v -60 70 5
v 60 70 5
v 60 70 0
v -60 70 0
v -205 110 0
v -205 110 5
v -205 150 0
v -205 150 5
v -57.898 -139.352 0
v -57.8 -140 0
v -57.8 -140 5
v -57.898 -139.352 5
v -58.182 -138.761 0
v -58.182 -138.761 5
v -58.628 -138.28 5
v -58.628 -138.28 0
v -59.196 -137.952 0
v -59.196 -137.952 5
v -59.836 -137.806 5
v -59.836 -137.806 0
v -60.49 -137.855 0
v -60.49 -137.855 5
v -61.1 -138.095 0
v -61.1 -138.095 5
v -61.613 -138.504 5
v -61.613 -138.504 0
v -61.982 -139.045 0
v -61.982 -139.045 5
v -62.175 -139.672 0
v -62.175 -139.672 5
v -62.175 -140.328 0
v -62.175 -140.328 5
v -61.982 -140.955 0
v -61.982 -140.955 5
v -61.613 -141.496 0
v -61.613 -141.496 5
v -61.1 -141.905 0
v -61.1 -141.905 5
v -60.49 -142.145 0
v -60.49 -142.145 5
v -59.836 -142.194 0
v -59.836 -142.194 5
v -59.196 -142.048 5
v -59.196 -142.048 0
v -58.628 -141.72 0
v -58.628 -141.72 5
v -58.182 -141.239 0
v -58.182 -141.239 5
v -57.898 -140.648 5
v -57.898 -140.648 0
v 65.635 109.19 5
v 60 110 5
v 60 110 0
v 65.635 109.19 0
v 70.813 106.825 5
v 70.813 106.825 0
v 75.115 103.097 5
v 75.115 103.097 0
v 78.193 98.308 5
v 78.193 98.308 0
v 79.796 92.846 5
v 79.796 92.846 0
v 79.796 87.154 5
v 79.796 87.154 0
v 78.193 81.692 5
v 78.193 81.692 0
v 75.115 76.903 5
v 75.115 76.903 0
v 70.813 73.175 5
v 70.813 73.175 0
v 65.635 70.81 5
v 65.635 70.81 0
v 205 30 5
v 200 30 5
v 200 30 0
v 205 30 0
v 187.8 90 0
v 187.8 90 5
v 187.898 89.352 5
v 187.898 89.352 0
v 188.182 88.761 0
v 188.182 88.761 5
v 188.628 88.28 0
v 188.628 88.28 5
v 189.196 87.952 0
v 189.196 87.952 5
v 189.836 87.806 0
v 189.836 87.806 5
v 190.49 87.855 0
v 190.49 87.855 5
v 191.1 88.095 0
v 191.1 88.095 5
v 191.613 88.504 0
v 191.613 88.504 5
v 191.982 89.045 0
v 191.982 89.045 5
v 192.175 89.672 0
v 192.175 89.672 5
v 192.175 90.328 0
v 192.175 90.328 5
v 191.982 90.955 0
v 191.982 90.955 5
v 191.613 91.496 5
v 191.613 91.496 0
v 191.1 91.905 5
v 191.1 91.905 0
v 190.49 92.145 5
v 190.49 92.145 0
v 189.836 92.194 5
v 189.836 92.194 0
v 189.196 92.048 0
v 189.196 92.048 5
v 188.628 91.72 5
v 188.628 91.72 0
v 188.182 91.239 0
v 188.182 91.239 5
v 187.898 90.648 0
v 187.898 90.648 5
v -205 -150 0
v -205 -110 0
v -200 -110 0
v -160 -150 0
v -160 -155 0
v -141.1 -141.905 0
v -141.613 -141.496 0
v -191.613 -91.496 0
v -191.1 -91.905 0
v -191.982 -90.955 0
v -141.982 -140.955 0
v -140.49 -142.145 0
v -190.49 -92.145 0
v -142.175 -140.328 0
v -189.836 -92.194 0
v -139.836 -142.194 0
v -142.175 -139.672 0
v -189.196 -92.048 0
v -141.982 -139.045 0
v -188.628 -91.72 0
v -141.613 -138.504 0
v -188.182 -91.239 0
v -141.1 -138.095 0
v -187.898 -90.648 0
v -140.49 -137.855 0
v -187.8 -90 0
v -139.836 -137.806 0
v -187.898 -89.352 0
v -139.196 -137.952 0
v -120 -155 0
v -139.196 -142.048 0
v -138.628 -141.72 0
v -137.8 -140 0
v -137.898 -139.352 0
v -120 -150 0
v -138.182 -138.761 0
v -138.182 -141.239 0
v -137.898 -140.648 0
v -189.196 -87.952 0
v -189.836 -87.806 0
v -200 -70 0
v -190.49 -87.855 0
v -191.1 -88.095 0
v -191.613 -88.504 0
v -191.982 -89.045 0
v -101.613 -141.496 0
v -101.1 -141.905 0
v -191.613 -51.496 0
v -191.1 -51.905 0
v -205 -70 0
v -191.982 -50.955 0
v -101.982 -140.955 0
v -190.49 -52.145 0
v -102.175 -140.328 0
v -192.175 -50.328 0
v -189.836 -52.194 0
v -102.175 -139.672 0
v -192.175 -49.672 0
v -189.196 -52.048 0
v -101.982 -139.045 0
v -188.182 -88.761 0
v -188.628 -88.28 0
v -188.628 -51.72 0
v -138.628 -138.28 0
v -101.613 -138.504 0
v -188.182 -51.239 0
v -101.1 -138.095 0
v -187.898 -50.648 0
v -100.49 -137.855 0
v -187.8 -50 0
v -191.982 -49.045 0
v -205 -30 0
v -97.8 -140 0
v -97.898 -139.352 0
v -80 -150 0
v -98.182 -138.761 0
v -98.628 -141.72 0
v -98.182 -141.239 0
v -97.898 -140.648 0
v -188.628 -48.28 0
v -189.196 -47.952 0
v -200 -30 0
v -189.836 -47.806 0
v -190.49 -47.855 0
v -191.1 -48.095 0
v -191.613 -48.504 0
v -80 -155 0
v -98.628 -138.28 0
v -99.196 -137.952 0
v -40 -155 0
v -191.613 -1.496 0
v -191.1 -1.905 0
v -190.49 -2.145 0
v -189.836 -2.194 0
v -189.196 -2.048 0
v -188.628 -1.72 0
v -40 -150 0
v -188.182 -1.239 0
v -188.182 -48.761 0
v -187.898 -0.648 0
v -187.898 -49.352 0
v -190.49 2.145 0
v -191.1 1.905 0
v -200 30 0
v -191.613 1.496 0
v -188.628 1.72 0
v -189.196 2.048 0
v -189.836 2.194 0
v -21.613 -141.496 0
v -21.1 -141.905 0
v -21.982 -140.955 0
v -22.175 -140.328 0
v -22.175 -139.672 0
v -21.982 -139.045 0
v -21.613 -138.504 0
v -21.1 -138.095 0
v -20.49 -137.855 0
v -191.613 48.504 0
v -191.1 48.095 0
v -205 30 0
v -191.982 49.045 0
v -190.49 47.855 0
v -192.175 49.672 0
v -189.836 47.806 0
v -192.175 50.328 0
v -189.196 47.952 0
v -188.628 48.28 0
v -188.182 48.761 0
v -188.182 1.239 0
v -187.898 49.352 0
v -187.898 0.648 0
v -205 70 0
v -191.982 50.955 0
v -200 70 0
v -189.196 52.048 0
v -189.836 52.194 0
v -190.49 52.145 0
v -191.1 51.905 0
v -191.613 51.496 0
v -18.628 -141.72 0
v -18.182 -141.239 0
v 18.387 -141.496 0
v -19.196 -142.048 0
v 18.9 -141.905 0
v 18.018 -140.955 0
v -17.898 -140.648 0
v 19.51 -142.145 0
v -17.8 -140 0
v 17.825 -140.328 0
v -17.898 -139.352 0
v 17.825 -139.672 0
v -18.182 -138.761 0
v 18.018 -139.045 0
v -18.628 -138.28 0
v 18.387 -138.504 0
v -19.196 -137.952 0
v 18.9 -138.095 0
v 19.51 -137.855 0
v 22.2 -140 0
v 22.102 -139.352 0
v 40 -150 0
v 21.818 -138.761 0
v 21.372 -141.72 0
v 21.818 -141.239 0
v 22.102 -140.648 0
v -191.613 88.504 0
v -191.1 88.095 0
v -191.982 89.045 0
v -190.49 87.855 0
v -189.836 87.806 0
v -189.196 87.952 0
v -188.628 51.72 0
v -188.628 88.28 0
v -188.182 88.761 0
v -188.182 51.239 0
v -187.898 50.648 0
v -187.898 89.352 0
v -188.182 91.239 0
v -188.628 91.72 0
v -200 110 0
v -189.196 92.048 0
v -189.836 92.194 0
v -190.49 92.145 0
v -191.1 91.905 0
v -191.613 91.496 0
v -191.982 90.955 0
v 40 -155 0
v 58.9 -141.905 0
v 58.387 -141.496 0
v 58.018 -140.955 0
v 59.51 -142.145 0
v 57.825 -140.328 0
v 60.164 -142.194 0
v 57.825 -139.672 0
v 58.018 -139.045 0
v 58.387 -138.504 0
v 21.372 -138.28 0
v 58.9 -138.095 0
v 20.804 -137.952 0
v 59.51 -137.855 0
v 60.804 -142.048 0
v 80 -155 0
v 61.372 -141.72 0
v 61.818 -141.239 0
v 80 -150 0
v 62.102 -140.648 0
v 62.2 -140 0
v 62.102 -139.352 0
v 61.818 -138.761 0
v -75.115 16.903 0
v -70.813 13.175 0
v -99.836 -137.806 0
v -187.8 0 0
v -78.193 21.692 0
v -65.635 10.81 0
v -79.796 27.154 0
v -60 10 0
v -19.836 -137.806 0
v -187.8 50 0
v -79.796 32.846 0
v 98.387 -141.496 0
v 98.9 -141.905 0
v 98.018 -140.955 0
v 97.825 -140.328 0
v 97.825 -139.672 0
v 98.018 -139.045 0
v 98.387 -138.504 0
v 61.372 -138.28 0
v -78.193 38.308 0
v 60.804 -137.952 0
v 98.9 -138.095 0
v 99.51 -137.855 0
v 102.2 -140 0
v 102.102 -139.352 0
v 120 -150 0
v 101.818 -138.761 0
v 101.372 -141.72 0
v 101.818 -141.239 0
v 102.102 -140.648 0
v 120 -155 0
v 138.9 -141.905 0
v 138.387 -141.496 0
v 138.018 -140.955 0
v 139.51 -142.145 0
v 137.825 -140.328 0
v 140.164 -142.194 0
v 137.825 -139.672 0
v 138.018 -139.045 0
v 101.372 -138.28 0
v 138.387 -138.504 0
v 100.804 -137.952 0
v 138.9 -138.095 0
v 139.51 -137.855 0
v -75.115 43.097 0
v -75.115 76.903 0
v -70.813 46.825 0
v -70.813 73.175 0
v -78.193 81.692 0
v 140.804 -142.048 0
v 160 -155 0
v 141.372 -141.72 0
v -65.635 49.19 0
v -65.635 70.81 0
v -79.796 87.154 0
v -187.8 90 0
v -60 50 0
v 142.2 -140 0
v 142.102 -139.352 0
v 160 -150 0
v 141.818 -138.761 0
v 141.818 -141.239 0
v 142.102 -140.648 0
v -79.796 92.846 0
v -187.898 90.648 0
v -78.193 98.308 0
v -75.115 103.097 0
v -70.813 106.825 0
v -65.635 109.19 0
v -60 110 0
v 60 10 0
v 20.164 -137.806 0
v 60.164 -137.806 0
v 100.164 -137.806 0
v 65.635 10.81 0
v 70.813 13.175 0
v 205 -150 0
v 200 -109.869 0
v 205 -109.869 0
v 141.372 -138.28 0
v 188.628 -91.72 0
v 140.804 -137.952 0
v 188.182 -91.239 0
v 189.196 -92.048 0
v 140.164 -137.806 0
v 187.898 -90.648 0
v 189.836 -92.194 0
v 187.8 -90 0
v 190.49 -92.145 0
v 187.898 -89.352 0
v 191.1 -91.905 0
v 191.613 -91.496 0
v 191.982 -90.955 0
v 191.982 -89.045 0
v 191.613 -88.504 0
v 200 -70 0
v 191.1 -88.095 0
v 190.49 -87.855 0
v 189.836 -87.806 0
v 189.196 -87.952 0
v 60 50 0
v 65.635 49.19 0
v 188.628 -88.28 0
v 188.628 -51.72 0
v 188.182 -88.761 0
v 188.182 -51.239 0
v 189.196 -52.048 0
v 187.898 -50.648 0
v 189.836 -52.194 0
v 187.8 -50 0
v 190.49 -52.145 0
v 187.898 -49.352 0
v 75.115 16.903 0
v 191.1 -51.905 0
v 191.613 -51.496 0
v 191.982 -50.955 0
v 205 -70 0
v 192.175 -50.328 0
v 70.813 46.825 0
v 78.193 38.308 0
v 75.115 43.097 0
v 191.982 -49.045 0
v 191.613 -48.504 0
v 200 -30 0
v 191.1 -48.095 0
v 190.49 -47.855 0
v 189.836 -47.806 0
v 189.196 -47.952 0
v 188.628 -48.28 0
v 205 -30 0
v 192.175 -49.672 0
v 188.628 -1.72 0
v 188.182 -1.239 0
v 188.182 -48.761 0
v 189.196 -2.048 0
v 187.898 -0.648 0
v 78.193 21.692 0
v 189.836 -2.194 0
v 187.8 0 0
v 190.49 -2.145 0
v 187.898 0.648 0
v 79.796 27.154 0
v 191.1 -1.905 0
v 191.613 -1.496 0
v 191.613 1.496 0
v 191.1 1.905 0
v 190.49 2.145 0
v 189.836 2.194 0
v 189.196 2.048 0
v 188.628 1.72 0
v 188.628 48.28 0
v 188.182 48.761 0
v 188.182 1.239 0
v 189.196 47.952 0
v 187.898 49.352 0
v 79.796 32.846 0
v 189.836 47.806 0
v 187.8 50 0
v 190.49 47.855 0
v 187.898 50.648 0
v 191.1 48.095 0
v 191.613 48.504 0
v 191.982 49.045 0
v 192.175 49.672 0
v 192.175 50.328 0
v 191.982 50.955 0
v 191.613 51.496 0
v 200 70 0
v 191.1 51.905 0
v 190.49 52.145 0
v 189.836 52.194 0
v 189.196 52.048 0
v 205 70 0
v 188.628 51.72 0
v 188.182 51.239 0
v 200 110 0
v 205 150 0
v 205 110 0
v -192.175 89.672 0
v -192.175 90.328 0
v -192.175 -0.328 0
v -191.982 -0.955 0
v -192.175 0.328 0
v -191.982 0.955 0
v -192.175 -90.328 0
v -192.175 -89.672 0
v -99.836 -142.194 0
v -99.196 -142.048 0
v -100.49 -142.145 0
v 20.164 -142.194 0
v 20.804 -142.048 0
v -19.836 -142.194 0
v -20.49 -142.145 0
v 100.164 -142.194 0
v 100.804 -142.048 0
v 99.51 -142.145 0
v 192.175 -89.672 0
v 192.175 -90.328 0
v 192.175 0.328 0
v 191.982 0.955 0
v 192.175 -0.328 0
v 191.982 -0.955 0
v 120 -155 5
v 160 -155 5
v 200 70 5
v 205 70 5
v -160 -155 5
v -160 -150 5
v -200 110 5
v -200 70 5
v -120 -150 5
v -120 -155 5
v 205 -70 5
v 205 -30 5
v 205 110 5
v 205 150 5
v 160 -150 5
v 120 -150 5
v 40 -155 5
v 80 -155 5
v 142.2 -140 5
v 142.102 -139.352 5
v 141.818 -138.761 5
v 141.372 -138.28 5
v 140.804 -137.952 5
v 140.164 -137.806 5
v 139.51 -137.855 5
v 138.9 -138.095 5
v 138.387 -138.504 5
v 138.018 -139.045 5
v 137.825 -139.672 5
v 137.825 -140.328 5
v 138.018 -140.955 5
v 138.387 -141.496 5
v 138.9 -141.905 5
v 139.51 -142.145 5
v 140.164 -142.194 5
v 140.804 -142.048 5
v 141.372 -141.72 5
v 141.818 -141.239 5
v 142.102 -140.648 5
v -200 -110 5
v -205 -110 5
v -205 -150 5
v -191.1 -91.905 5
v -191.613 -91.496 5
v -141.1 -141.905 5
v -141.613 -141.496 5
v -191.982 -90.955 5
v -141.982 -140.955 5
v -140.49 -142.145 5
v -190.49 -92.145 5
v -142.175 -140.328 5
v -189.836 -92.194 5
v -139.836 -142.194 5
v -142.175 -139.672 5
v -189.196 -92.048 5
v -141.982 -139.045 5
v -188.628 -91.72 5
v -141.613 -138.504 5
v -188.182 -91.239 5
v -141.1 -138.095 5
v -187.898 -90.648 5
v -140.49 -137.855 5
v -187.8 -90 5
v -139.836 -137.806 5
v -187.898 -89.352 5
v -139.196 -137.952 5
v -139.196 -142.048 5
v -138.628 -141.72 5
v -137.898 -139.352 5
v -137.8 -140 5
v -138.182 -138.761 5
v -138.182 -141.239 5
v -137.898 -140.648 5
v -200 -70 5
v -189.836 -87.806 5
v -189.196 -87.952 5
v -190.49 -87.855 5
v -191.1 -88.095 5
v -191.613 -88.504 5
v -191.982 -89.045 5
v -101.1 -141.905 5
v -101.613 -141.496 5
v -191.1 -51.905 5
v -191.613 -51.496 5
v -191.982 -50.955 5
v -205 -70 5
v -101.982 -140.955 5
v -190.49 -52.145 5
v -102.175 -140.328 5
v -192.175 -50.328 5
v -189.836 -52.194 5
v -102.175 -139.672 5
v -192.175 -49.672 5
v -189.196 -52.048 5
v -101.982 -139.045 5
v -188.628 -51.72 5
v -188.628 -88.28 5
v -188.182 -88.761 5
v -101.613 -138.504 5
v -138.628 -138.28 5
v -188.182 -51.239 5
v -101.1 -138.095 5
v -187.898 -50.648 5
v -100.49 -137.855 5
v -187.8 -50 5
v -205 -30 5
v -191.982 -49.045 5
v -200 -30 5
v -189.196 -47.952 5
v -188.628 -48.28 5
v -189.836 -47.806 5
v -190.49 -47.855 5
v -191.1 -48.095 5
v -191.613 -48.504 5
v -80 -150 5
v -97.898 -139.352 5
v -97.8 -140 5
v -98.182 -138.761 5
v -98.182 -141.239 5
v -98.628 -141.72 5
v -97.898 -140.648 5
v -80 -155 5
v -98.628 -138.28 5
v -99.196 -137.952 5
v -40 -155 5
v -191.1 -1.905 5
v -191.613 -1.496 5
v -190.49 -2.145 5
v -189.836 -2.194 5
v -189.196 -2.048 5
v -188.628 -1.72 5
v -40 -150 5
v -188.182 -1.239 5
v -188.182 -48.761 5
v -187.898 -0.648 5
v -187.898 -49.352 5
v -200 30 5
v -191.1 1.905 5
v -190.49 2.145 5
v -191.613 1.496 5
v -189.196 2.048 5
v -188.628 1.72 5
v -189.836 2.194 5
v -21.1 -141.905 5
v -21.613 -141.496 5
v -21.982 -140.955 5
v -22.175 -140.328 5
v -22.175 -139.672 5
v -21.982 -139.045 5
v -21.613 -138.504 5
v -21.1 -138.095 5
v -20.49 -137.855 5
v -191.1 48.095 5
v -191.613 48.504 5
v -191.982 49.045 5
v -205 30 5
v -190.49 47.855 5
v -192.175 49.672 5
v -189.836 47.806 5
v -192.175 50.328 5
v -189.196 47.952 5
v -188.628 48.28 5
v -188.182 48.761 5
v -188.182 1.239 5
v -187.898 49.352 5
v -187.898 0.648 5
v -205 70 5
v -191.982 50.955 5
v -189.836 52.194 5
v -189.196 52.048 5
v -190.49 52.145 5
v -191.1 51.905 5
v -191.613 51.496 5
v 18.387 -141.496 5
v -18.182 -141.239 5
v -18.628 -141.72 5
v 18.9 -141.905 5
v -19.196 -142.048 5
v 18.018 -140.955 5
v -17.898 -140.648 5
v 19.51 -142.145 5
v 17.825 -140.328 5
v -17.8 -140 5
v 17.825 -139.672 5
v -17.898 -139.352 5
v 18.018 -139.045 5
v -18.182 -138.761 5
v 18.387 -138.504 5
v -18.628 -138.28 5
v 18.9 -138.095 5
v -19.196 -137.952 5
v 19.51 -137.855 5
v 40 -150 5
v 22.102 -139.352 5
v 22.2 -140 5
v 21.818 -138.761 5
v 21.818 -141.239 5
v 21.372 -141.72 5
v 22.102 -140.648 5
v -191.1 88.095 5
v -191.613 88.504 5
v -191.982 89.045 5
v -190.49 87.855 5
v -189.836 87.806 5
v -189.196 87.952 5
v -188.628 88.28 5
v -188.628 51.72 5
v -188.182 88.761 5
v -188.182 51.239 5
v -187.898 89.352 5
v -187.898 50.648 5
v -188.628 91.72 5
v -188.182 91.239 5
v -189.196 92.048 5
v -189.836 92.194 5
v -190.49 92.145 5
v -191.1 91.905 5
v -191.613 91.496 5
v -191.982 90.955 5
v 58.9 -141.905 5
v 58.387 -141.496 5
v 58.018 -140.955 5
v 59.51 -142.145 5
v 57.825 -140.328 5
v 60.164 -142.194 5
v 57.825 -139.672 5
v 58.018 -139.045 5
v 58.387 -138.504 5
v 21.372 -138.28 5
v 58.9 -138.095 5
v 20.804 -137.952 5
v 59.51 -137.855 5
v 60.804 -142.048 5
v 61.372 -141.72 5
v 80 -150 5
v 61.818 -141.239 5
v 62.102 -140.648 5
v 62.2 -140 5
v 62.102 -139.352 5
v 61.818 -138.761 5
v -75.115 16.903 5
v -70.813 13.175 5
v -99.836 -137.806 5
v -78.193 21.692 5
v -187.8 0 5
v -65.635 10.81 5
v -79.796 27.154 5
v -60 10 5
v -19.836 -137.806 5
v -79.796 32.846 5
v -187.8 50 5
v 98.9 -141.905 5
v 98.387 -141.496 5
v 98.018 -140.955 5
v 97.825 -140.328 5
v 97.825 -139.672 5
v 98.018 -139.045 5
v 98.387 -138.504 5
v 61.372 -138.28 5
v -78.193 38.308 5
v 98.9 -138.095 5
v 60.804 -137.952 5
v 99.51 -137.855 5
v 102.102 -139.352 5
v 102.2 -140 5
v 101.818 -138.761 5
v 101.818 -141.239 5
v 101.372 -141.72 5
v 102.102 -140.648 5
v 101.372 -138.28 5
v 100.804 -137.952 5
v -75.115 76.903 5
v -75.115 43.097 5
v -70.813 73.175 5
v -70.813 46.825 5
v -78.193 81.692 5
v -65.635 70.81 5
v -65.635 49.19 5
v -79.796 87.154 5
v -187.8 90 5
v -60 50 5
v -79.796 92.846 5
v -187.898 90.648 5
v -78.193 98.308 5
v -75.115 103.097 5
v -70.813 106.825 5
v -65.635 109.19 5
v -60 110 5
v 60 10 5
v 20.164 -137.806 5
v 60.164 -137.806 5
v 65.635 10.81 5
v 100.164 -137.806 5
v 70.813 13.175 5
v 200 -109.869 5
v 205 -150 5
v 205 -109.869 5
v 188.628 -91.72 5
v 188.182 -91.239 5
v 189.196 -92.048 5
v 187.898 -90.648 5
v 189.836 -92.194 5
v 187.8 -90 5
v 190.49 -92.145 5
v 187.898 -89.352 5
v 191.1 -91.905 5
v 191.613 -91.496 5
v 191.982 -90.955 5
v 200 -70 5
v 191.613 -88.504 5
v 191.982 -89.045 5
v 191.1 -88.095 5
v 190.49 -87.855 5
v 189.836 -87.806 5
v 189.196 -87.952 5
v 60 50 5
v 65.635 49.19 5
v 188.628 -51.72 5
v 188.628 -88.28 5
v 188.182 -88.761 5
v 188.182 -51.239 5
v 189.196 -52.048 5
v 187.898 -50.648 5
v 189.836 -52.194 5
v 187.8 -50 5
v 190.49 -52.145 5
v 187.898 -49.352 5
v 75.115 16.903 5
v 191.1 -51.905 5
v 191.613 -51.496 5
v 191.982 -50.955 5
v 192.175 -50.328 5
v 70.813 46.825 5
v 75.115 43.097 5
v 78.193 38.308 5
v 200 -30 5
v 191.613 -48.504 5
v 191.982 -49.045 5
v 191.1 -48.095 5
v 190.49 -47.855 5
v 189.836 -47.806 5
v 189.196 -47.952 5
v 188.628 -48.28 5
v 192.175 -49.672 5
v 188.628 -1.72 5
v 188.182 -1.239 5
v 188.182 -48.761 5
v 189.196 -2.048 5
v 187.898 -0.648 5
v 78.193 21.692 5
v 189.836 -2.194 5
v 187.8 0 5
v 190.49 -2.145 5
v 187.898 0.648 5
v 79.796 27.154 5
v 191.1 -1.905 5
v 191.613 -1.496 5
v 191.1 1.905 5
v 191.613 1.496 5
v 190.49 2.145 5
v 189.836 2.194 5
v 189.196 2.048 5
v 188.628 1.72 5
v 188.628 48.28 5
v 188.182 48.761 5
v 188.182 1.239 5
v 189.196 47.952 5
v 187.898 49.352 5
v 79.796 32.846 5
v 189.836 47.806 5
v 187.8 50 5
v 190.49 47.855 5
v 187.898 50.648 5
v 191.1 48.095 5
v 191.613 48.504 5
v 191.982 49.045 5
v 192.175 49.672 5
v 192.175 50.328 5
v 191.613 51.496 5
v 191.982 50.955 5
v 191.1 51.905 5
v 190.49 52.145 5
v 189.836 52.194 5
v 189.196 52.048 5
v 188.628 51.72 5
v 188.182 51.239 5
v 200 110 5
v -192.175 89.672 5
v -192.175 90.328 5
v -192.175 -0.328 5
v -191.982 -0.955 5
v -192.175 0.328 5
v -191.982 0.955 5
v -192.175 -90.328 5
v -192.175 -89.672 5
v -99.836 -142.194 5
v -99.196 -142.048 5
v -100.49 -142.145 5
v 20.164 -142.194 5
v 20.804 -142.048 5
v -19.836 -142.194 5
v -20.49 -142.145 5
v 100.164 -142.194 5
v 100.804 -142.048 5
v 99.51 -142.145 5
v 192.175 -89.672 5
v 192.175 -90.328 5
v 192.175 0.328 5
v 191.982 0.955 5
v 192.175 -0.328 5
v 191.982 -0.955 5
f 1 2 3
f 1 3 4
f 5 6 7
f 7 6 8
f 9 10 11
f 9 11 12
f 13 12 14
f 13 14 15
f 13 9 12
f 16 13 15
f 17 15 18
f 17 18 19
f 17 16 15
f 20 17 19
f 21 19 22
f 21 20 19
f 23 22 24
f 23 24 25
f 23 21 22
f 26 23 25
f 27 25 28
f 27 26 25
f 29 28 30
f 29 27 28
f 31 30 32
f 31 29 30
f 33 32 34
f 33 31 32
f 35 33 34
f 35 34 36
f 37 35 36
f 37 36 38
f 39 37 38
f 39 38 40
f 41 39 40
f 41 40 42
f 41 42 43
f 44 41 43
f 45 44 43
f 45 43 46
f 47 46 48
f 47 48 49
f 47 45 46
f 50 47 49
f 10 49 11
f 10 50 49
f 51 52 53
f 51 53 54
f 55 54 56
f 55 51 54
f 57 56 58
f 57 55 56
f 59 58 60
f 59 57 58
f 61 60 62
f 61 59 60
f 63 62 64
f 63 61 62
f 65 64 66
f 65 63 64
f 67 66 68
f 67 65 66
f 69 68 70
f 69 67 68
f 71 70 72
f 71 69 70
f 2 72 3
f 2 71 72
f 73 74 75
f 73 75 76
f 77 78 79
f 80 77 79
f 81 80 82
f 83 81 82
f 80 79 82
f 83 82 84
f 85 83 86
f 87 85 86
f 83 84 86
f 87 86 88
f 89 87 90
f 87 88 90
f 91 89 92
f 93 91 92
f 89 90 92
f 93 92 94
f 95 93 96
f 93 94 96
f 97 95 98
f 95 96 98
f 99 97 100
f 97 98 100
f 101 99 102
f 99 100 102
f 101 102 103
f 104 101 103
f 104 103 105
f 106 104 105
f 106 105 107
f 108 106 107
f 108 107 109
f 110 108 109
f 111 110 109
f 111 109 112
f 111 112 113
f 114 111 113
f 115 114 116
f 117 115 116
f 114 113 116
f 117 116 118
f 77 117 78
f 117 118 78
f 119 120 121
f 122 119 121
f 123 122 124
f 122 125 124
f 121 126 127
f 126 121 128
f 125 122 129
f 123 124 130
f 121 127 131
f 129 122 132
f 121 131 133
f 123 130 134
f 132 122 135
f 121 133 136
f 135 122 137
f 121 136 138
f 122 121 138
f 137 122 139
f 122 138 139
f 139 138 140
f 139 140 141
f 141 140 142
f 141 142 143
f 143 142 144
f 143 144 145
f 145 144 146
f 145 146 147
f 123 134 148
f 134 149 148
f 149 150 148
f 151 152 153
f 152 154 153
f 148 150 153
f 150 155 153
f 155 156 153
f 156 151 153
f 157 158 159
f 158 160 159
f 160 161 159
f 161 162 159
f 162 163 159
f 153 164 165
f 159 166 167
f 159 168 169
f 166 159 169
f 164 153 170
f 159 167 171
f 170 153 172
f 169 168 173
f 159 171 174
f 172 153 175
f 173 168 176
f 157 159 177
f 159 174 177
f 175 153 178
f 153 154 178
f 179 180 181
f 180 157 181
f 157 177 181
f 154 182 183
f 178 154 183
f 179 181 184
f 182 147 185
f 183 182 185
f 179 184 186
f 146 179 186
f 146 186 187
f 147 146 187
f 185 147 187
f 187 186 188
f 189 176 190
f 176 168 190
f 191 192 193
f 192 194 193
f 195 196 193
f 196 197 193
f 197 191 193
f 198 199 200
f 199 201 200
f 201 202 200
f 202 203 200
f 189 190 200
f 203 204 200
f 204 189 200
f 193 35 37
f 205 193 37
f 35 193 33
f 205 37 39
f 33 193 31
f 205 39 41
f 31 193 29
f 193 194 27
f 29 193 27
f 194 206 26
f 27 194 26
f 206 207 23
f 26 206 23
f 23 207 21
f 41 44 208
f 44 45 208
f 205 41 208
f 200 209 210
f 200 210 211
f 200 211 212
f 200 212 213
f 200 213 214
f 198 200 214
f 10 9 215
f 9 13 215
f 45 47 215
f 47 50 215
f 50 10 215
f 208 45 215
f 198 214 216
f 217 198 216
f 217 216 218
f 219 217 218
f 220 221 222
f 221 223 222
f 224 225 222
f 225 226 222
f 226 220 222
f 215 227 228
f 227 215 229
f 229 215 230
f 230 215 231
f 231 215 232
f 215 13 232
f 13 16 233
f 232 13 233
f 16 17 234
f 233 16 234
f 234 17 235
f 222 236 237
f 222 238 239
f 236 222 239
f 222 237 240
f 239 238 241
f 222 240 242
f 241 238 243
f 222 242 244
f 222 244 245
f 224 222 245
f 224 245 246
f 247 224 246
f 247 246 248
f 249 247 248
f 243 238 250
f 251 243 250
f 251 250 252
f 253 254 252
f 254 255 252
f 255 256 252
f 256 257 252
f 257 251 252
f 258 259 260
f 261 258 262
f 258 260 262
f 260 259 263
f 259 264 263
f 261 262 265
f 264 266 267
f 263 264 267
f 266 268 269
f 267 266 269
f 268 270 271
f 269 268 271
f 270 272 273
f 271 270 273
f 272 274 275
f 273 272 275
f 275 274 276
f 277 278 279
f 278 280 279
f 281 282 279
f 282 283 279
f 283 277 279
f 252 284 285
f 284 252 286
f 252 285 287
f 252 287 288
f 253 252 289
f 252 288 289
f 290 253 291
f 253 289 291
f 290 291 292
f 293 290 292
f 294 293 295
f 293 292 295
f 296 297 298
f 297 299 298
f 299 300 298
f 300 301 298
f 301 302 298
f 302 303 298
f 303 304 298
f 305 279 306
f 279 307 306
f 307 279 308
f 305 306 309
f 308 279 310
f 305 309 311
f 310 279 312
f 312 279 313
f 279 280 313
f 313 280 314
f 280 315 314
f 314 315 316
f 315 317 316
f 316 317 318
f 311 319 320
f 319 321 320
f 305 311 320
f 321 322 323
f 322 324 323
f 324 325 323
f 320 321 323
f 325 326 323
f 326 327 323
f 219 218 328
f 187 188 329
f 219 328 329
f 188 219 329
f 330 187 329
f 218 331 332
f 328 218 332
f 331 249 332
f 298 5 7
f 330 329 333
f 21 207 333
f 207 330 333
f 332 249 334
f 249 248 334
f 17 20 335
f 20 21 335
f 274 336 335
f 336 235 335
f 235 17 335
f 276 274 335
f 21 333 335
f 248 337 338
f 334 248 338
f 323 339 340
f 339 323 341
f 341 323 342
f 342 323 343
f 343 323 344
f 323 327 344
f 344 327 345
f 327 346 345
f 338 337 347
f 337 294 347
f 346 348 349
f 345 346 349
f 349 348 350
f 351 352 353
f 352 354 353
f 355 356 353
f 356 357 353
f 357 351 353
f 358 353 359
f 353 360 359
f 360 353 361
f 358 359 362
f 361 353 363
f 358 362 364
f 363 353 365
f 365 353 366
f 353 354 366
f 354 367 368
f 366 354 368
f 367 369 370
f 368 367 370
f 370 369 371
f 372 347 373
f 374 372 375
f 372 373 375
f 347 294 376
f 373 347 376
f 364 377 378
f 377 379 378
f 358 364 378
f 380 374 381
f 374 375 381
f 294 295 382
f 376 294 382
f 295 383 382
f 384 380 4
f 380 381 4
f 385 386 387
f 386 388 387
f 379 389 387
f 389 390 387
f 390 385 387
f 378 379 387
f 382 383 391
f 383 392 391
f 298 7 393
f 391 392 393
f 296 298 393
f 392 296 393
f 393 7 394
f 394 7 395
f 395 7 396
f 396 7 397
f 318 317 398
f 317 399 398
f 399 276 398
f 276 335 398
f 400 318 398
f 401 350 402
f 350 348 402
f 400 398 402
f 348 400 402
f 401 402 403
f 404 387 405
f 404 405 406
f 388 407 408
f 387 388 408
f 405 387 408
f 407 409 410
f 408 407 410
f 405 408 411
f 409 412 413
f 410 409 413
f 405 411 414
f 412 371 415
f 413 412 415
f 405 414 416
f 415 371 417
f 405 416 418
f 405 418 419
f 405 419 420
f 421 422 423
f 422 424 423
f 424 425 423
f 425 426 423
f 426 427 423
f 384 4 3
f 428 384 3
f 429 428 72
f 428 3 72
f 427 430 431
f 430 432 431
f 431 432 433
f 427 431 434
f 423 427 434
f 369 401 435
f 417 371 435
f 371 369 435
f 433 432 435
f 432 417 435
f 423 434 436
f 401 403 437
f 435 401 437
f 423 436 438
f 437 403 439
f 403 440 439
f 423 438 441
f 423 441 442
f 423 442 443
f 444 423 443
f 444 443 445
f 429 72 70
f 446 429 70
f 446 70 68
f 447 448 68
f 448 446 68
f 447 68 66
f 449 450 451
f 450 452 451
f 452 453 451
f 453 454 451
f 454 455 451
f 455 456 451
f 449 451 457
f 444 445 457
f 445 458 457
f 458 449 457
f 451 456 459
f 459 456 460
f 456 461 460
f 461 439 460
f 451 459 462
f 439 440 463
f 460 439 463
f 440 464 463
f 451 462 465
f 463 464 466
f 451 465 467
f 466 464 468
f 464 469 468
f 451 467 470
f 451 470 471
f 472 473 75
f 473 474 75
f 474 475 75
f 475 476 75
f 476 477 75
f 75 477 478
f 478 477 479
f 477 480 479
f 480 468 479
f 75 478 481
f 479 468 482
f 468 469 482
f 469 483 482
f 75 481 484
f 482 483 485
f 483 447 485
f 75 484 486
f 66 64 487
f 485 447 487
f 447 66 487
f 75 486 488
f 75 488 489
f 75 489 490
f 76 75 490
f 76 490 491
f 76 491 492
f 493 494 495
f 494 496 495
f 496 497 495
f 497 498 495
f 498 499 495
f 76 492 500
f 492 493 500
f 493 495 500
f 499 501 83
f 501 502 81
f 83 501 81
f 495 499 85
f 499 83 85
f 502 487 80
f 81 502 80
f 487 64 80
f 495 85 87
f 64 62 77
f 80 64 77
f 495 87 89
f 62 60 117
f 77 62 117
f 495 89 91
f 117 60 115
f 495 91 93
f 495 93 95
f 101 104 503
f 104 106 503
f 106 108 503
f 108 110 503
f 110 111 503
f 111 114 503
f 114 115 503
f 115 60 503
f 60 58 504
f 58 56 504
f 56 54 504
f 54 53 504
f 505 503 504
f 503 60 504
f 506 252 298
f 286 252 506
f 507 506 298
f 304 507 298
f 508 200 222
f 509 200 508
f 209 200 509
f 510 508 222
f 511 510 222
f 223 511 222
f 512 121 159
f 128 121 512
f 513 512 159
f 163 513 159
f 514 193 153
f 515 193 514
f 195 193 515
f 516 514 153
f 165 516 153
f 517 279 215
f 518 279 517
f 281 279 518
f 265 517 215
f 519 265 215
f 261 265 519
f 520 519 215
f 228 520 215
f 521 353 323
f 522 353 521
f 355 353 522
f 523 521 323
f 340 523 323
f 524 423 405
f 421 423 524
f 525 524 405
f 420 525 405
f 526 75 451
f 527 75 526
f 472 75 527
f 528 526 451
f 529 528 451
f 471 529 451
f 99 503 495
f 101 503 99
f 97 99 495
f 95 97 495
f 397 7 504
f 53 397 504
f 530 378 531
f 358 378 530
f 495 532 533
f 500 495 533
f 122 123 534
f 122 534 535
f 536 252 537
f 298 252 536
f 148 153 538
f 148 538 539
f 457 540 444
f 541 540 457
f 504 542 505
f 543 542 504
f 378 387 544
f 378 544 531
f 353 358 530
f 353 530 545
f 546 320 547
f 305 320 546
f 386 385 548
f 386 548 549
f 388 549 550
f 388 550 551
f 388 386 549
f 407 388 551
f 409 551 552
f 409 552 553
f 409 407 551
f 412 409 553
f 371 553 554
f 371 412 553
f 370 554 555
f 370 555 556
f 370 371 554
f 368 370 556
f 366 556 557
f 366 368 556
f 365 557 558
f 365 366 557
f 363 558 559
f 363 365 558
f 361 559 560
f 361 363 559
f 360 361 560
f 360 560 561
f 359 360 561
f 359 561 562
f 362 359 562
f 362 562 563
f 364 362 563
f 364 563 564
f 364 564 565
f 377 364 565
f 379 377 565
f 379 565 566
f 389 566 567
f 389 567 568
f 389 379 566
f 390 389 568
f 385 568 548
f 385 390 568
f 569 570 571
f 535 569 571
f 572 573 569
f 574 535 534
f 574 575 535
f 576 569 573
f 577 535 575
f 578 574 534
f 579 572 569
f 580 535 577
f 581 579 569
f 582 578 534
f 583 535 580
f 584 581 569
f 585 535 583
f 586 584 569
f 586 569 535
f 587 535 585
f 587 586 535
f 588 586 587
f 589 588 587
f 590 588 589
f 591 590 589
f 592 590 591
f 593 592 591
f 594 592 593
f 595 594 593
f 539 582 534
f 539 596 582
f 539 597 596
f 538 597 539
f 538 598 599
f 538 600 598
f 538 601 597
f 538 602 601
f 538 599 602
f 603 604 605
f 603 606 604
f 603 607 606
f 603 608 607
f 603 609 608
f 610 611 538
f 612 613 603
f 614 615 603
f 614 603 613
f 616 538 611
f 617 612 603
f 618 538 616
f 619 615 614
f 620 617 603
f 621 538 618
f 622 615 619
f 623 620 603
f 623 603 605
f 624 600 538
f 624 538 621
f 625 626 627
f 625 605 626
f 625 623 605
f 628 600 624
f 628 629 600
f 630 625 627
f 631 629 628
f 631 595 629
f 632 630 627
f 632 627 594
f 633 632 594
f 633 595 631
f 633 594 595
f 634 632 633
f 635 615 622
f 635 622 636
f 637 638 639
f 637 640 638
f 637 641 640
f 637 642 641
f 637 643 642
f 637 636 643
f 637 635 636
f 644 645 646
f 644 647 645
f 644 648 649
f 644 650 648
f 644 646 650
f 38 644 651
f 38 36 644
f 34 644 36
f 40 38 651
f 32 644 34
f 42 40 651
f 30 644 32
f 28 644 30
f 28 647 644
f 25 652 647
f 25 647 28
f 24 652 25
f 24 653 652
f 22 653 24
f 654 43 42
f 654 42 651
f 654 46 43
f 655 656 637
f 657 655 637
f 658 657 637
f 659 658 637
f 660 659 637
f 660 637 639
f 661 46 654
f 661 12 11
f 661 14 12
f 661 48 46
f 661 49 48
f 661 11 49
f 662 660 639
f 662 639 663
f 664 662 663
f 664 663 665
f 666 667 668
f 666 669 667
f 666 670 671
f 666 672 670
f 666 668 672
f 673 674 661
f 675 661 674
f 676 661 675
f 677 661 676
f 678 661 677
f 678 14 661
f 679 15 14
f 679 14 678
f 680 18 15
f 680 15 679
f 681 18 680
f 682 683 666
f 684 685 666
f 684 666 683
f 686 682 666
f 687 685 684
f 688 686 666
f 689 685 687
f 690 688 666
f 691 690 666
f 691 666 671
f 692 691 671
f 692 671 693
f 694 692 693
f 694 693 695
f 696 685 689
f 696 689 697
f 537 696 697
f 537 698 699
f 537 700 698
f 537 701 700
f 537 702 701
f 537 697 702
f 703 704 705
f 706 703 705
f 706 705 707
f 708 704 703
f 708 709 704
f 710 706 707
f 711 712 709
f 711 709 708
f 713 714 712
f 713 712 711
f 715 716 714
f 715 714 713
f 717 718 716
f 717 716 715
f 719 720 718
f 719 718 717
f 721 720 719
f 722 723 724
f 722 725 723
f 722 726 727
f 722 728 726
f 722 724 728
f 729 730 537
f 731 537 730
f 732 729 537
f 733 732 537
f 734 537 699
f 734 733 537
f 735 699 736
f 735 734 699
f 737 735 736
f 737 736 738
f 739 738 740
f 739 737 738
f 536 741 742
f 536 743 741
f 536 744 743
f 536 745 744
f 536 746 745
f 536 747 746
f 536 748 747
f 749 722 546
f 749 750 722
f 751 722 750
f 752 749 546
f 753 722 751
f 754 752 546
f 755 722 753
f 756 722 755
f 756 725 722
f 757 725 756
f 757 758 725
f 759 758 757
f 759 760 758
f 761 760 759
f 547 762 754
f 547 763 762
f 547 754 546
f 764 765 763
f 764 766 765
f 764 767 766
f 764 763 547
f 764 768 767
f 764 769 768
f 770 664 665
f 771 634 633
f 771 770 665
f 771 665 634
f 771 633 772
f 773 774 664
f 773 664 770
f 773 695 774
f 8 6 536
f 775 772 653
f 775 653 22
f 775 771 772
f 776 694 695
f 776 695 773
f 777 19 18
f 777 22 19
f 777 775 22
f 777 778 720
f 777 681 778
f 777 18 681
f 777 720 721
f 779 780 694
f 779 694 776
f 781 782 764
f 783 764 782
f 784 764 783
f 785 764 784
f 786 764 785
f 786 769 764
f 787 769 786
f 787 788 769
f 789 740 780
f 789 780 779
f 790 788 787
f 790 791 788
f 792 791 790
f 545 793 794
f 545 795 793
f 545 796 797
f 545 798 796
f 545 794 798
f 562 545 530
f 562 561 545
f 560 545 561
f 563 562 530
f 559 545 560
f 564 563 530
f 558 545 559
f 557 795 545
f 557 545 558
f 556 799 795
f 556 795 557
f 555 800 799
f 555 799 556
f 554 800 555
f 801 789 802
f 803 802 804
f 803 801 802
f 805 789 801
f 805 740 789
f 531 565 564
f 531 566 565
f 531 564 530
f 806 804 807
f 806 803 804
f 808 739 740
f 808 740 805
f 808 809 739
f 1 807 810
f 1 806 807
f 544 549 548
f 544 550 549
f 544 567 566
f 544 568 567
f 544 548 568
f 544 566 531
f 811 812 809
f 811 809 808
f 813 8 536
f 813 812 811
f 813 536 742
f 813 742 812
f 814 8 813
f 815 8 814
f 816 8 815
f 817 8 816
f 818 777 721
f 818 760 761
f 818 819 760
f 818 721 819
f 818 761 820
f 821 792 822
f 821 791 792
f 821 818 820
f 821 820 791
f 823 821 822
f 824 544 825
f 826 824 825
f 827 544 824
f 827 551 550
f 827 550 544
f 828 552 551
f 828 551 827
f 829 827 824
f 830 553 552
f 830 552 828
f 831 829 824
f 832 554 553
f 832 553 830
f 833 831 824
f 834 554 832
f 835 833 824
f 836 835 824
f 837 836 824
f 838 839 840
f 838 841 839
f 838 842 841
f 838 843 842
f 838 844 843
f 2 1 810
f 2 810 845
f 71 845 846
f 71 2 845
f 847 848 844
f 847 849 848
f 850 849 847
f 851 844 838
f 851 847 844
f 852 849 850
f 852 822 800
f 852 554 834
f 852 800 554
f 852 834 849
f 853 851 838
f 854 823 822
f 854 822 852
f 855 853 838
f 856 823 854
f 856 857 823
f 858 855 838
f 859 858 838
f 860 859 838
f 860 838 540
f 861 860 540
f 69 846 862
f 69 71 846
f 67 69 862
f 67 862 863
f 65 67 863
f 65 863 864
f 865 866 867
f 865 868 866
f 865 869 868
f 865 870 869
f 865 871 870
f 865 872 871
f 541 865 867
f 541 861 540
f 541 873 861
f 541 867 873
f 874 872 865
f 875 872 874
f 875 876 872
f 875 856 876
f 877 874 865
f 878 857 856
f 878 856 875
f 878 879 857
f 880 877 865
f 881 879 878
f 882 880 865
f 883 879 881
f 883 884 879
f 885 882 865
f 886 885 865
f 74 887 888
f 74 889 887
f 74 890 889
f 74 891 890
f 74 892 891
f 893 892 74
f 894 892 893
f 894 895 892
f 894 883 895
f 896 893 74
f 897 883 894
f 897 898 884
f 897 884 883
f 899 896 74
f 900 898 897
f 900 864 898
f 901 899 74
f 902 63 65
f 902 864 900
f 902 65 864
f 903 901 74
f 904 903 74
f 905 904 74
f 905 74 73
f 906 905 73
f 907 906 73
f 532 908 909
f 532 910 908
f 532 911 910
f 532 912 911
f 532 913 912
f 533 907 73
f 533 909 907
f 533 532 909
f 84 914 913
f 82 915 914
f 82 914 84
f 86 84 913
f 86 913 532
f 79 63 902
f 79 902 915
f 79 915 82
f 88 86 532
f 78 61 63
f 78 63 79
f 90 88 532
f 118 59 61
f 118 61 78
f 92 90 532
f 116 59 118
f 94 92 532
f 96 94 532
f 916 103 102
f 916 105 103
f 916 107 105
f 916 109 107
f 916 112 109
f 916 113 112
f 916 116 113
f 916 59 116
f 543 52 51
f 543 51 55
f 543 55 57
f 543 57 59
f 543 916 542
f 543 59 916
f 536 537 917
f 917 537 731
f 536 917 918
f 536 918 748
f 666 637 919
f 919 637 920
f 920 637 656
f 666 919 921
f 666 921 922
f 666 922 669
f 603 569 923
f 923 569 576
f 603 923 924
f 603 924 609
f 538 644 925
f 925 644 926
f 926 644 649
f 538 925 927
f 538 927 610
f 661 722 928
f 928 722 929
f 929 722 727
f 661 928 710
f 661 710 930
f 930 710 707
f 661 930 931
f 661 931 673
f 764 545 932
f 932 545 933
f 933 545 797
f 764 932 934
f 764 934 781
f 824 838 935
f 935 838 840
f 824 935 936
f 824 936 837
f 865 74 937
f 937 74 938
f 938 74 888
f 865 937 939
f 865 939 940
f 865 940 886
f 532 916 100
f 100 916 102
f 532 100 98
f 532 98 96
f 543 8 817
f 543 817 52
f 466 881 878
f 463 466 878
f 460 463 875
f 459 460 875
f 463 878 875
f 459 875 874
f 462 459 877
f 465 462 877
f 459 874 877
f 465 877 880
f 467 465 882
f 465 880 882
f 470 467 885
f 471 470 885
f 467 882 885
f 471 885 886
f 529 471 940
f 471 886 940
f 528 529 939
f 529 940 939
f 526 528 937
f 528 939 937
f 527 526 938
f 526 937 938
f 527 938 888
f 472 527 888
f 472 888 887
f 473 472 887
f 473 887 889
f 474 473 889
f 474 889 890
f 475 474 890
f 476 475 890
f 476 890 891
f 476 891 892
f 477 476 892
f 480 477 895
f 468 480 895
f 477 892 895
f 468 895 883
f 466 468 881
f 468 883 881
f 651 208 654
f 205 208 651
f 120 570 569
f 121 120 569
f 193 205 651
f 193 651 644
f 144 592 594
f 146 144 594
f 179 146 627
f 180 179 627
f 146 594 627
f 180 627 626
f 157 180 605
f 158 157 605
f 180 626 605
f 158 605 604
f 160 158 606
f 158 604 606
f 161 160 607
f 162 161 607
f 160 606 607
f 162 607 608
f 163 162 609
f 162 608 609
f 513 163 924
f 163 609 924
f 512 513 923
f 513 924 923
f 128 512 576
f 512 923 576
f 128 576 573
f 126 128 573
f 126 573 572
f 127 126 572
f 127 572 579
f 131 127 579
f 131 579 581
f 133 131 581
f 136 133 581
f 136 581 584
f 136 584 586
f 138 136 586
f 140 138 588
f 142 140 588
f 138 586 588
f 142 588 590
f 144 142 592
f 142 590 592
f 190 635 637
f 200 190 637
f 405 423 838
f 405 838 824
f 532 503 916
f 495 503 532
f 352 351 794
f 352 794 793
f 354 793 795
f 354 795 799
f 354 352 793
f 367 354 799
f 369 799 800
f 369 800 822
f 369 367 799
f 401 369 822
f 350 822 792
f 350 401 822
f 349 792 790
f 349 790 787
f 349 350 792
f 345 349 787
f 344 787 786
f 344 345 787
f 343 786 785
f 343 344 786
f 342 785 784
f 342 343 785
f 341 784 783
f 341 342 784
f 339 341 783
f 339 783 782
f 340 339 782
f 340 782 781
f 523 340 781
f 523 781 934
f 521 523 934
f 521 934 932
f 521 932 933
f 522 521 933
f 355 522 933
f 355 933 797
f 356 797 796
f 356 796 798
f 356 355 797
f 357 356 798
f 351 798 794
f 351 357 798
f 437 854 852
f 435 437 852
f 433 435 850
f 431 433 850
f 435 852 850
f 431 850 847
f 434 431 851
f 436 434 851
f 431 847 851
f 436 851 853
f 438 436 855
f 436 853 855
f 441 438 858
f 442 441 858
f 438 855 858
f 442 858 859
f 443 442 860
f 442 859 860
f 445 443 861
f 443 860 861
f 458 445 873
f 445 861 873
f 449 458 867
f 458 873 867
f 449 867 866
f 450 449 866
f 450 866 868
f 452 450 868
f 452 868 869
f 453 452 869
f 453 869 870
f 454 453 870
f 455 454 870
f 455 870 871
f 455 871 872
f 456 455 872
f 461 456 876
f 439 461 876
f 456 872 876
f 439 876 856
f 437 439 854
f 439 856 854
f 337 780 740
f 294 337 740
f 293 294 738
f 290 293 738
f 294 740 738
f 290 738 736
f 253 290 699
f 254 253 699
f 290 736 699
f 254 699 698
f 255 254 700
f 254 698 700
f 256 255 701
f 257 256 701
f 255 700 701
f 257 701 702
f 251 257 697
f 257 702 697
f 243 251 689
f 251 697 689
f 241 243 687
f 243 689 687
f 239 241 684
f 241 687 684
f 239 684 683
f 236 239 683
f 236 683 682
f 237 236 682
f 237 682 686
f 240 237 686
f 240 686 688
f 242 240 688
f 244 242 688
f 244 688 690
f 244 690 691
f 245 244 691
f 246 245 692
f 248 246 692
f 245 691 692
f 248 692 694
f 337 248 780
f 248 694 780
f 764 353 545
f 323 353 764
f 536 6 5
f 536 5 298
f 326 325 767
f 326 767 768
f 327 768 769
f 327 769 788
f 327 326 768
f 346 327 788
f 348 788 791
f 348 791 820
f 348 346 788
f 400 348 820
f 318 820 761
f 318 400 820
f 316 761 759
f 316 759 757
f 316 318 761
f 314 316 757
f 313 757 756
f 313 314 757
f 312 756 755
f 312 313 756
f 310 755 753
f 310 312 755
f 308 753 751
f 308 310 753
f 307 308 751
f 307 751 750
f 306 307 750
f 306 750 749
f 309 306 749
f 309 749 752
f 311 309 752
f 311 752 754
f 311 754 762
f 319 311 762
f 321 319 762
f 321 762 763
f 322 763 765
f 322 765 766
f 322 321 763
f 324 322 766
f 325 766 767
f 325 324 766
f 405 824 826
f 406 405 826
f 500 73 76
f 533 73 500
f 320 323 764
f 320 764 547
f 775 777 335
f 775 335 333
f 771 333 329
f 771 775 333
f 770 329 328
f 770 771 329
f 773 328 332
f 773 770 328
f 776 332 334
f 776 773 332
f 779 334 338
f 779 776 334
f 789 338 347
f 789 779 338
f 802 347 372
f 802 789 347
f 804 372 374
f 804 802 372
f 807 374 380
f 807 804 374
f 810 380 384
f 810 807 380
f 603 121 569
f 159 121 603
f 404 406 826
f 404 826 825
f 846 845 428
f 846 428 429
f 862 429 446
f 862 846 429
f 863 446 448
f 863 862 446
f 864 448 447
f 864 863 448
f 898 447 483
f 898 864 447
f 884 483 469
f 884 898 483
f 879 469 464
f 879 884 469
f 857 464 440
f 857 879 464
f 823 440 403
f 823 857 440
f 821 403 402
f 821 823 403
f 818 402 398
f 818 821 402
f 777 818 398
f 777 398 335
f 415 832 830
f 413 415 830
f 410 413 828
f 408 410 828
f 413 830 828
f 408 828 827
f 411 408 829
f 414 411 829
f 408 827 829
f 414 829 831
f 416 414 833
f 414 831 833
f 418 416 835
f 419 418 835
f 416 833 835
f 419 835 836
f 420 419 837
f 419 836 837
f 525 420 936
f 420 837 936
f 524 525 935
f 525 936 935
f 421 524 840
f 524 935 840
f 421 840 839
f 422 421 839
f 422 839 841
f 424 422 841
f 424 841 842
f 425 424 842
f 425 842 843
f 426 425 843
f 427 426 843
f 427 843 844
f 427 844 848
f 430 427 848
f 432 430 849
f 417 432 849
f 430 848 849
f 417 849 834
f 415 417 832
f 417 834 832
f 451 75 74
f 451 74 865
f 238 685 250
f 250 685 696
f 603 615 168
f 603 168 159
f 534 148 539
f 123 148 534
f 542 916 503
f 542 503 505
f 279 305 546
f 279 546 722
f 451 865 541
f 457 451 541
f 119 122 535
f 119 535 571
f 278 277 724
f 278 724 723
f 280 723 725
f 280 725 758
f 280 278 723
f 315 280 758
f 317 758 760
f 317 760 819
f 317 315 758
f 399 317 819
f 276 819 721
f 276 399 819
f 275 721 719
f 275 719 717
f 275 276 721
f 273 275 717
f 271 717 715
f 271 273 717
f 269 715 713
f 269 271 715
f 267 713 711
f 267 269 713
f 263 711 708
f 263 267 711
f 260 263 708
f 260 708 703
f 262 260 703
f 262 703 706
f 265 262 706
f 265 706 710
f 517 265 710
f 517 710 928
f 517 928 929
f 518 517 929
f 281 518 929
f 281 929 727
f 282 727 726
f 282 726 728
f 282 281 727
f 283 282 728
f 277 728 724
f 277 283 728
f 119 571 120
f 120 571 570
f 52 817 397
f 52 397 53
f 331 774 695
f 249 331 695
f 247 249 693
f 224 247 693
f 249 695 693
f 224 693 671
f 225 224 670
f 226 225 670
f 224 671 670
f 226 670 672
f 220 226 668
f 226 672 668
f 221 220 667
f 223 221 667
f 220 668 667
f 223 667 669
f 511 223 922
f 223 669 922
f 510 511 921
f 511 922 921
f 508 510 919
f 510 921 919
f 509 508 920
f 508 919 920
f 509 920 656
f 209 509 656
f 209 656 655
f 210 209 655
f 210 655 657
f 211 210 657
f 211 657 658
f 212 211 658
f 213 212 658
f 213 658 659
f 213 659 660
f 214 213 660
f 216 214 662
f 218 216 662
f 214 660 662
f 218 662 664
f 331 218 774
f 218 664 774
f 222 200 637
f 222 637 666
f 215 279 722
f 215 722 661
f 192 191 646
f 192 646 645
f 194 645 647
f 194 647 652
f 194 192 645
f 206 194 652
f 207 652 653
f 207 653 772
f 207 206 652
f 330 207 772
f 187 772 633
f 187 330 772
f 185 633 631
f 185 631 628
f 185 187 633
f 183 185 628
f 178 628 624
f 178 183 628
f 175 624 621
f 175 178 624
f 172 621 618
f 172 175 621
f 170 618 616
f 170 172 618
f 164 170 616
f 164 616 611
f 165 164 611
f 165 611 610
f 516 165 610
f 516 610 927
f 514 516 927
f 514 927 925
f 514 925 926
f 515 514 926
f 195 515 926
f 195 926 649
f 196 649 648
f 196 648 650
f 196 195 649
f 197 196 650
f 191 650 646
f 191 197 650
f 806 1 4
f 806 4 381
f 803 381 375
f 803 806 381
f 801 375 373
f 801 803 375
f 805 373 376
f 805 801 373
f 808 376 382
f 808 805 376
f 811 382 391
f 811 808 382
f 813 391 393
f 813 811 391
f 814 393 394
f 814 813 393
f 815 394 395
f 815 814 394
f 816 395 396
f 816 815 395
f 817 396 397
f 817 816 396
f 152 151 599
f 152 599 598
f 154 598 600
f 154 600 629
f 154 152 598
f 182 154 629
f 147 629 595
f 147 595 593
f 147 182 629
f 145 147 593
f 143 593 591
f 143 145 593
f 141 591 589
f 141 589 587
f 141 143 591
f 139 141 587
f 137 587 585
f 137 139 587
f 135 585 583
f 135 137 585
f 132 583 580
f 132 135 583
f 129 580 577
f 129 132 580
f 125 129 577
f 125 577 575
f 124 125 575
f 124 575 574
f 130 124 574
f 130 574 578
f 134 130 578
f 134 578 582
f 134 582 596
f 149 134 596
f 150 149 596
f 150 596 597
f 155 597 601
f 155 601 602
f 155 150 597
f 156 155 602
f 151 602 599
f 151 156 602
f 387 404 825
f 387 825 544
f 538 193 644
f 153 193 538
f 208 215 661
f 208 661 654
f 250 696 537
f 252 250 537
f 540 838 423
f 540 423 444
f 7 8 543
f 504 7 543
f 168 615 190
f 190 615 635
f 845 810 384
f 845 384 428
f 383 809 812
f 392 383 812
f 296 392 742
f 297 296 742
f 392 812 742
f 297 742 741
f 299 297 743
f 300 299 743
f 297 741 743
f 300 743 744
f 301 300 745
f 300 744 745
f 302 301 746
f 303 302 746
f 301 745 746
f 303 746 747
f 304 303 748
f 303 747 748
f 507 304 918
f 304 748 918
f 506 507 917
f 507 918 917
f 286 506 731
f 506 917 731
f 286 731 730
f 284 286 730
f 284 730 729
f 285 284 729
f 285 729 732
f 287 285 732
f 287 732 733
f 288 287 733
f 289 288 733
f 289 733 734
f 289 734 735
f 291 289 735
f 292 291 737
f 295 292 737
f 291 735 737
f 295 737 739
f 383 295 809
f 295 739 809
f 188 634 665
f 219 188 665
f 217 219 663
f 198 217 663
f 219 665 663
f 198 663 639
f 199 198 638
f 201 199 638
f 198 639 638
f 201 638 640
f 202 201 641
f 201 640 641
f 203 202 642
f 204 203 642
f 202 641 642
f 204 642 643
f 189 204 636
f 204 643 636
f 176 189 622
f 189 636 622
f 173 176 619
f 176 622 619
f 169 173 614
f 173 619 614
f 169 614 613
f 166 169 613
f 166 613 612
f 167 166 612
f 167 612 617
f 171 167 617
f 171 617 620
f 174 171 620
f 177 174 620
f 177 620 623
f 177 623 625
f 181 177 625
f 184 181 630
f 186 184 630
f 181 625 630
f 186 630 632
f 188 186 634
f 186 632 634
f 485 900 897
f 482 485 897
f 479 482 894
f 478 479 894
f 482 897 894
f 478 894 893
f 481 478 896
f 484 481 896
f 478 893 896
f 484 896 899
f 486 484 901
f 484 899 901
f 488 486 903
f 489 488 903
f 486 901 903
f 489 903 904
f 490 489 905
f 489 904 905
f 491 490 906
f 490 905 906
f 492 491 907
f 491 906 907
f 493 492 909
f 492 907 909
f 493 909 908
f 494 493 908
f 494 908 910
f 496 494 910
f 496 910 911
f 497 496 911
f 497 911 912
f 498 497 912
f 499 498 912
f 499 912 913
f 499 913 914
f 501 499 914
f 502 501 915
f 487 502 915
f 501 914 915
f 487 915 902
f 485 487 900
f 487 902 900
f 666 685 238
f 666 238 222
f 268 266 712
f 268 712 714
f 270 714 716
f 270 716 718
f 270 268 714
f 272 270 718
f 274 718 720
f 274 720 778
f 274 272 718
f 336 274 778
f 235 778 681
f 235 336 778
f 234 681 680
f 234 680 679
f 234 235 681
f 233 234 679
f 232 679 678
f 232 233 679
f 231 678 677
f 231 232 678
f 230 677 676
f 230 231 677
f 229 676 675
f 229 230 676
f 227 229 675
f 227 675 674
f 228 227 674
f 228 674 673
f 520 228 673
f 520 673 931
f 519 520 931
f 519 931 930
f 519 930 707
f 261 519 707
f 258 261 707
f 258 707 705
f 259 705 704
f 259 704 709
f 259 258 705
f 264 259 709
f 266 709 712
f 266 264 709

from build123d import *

# Parameters (mm, degrees)
SKETCH_1_R          = 2.2
EXTRUDE_1_DEPTH     = 5
SKETCH_2_W          = 5
SKETCH_2_H          = 220.282443136
SKETCH_2_H_2        = 219.868690955
CUT_EXTRUDE_1_DEPTH = 10
SKETCH_3_W          = 5
SKETCH_3_H          = 40
EXTRUDE_3_DEPTH     = 5
SKETCH_4_W          = 390.4211829
SKETCH_4_H          = 264.690207343
EXTRUDE_4_DEPTH     = 5
SKETCH_5_R          = 2.2
CUT_EXTRUDE_2_DEPTH = 5
CUT_EXTRUDE_3_DEPTH = 10


with BuildPart() as part:
    # 草图1 → 凸台-拉伸1 (new body)
    with BuildSketch(Plane.XY):
        Polygon((-200, 150), (200, 150), (200, 110), (205, 110), (205, 70), (200, 70), (200, 30), (205, 30), (205, -30), (200, -30), (200, -70), (205, -70), (205, -110), (200, -110), (200, -150), (160, -150), (160, -155), (120, -155), (120, -150), (80, -150), (80, -155), (40, -155), (40, -150), (-40, -150), (-40, -155), (-80, -155), (-80, -150), (-120, -150), (-120, -155), (-160, -155), (-160, -150), (-200, -150), (-200, -110), (-205, -110), (-205, -70), (-200, -70), (-200, -30), (-205, -30), (-205, 30), (-200, 30), (-200, 70), (-205, 70), (-205, 110), (-200, 110), align=None)
        with Locations((-140, -140)):
            Circle(SKETCH_1_R, mode=Mode.SUBTRACT)
        with Locations((-100, -140)):
            Circle(SKETCH_1_R, mode=Mode.SUBTRACT)
        with Locations((-60, -140)):
            Circle(SKETCH_1_R, mode=Mode.SUBTRACT)
        with Locations((-20, -140)):
            Circle(SKETCH_1_R, mode=Mode.SUBTRACT)
        with Locations((20, -140)):
            Circle(SKETCH_1_R, mode=Mode.SUBTRACT)
        with Locations((60, -140)):
            Circle(SKETCH_1_R, mode=Mode.SUBTRACT)
        with Locations((100, -140)):
            Circle(SKETCH_1_R, mode=Mode.SUBTRACT)
        with Locations((140, -140)):
            Circle(SKETCH_1_R, mode=Mode.SUBTRACT)
        with Locations((-190, 110)):
            Circle(SKETCH_1_R, mode=Mode.SUBTRACT)
        with Locations((-190, 70)):
            Circle(SKETCH_1_R, mode=Mode.SUBTRACT)
        with Locations((-190, 30)):
            Circle(SKETCH_1_R, mode=Mode.SUBTRACT)
        with Locations((-190, -30)):
            Circle(SKETCH_1_R, mode=Mode.SUBTRACT)
        with Locations((-190, -70)):
            Circle(SKETCH_1_R, mode=Mode.SUBTRACT)
        with Locations((-190, -110)):
            Circle(SKETCH_1_R, mode=Mode.SUBTRACT)
        with Locations((190, -110)):
            Circle(SKETCH_1_R, mode=Mode.SUBTRACT)
        with Locations((190, -70)):
            Circle(SKETCH_1_R, mode=Mode.SUBTRACT)
        with Locations((190, -30)):
            Circle(SKETCH_1_R, mode=Mode.SUBTRACT)
        with Locations((190, 30)):
            Circle(SKETCH_1_R, mode=Mode.SUBTRACT)
        with Locations((190, 70)):
            Circle(SKETCH_1_R, mode=Mode.SUBTRACT)
        with Locations((190, 110)):
            Circle(SKETCH_1_R, mode=Mode.SUBTRACT)
    extrude(amount=EXTRUDE_1_DEPTH)

    # 草图2 → 切除-拉伸1 (cut)
    with BuildSketch(Plane.XY.offset(5)):
        with Locations((-202.5, -0.141221568)):
            Rectangle(SKETCH_2_W, SKETCH_2_H)
        with Locations((202.5, 0.065654522)):
            Rectangle(SKETCH_2_W, SKETCH_2_H_2)
    extrude(amount=-CUT_EXTRUDE_1_DEPTH, mode=Mode.SUBTRACT)

    # 草图3 → 凸台-拉伸3 (add)
    with BuildSketch(Plane.XY.offset(5)):
        with Locations((-202.5, 130)):
            Rectangle(SKETCH_3_W, SKETCH_3_H)
        with Locations((-202.5, 50)):
            Rectangle(SKETCH_3_W, SKETCH_3_H)
        with Locations((-202.5, -50)):
            Rectangle(SKETCH_3_W, SKETCH_3_H)
        with Locations((-202.5, -130)):
            Rectangle(SKETCH_3_W, SKETCH_3_H)
        with Locations((202.5, -130)):
            Rectangle(SKETCH_3_W, SKETCH_3_H)
        with Locations((202.5, -50)):
            Rectangle(SKETCH_3_W, SKETCH_3_H)
        with Locations((202.5, 50)):
            Rectangle(SKETCH_3_W, SKETCH_3_H)
        with Locations((202.5, 130)):
            Rectangle(SKETCH_3_W, SKETCH_3_H)
    extrude(amount=-EXTRUDE_3_DEPTH)

    # 草图4 → 凸台-拉伸4 (add)
    with BuildSketch(Plane.XY.offset(5)):
        with Locations((1.806920954, 7.46039962)):
            Rectangle(SKETCH_4_W, SKETCH_4_H)
    extrude(amount=-EXTRUDE_4_DEPTH)

    # 草图5 → 切除-拉伸2 (cut)
    with BuildSketch(Plane.XY.offset(5)):
        with Locations((-190, 90)):
            Circle(SKETCH_5_R)
        with Locations((-190, 50)):
            Circle(SKETCH_5_R)
        with Locations((-190, 0)):
            Circle(SKETCH_5_R)
        with Locations((-190, -50)):
            Circle(SKETCH_5_R)
        with Locations((-190, -90)):
            Circle(SKETCH_5_R)
        with Locations(Location((190, -90, 0), (0, 0, 180))):
            Circle(SKETCH_5_R)
        with Locations(Location((190, -50, 0), (0, 0, 180))):
            Circle(SKETCH_5_R)
        with Locations(Location((190, 0, 0), (0, 0, 180))):
            Circle(SKETCH_5_R)
        with Locations(Location((190, 50, 0), (0, 0, 180))):
            Circle(SKETCH_5_R)
        with Locations(Location((190, 90, 0), (0, 0, 180))):
            Circle(SKETCH_5_R)
    extrude(amount=-CUT_EXTRUDE_2_DEPTH, mode=Mode.SUBTRACT)

    # 草图6 → 切除-拉伸3 (cut)
    with BuildSketch(Plane.XY.offset(5)):
        with BuildLine():
            Line((-60, 50), (60, 50))
            ThreePointArc((60, 50), (80, 30), (60, 10))
            Line((60, 10), (-60, 10))
            ThreePointArc((-60, 10), (-80, 30), (-60, 50))
        make_face()
        with BuildLine():
            Line((-60, 110), (60, 110))
            ThreePointArc((60, 110), (80, 90), (60, 70))
            Line((60, 70), (-60, 70))
            ThreePointArc((-60, 70), (-80, 90), (-60, 110))
        make_face()
    extrude(amount=-CUT_EXTRUDE_3_DEPTH, mode=Mode.SUBTRACT)


solid = part.part
